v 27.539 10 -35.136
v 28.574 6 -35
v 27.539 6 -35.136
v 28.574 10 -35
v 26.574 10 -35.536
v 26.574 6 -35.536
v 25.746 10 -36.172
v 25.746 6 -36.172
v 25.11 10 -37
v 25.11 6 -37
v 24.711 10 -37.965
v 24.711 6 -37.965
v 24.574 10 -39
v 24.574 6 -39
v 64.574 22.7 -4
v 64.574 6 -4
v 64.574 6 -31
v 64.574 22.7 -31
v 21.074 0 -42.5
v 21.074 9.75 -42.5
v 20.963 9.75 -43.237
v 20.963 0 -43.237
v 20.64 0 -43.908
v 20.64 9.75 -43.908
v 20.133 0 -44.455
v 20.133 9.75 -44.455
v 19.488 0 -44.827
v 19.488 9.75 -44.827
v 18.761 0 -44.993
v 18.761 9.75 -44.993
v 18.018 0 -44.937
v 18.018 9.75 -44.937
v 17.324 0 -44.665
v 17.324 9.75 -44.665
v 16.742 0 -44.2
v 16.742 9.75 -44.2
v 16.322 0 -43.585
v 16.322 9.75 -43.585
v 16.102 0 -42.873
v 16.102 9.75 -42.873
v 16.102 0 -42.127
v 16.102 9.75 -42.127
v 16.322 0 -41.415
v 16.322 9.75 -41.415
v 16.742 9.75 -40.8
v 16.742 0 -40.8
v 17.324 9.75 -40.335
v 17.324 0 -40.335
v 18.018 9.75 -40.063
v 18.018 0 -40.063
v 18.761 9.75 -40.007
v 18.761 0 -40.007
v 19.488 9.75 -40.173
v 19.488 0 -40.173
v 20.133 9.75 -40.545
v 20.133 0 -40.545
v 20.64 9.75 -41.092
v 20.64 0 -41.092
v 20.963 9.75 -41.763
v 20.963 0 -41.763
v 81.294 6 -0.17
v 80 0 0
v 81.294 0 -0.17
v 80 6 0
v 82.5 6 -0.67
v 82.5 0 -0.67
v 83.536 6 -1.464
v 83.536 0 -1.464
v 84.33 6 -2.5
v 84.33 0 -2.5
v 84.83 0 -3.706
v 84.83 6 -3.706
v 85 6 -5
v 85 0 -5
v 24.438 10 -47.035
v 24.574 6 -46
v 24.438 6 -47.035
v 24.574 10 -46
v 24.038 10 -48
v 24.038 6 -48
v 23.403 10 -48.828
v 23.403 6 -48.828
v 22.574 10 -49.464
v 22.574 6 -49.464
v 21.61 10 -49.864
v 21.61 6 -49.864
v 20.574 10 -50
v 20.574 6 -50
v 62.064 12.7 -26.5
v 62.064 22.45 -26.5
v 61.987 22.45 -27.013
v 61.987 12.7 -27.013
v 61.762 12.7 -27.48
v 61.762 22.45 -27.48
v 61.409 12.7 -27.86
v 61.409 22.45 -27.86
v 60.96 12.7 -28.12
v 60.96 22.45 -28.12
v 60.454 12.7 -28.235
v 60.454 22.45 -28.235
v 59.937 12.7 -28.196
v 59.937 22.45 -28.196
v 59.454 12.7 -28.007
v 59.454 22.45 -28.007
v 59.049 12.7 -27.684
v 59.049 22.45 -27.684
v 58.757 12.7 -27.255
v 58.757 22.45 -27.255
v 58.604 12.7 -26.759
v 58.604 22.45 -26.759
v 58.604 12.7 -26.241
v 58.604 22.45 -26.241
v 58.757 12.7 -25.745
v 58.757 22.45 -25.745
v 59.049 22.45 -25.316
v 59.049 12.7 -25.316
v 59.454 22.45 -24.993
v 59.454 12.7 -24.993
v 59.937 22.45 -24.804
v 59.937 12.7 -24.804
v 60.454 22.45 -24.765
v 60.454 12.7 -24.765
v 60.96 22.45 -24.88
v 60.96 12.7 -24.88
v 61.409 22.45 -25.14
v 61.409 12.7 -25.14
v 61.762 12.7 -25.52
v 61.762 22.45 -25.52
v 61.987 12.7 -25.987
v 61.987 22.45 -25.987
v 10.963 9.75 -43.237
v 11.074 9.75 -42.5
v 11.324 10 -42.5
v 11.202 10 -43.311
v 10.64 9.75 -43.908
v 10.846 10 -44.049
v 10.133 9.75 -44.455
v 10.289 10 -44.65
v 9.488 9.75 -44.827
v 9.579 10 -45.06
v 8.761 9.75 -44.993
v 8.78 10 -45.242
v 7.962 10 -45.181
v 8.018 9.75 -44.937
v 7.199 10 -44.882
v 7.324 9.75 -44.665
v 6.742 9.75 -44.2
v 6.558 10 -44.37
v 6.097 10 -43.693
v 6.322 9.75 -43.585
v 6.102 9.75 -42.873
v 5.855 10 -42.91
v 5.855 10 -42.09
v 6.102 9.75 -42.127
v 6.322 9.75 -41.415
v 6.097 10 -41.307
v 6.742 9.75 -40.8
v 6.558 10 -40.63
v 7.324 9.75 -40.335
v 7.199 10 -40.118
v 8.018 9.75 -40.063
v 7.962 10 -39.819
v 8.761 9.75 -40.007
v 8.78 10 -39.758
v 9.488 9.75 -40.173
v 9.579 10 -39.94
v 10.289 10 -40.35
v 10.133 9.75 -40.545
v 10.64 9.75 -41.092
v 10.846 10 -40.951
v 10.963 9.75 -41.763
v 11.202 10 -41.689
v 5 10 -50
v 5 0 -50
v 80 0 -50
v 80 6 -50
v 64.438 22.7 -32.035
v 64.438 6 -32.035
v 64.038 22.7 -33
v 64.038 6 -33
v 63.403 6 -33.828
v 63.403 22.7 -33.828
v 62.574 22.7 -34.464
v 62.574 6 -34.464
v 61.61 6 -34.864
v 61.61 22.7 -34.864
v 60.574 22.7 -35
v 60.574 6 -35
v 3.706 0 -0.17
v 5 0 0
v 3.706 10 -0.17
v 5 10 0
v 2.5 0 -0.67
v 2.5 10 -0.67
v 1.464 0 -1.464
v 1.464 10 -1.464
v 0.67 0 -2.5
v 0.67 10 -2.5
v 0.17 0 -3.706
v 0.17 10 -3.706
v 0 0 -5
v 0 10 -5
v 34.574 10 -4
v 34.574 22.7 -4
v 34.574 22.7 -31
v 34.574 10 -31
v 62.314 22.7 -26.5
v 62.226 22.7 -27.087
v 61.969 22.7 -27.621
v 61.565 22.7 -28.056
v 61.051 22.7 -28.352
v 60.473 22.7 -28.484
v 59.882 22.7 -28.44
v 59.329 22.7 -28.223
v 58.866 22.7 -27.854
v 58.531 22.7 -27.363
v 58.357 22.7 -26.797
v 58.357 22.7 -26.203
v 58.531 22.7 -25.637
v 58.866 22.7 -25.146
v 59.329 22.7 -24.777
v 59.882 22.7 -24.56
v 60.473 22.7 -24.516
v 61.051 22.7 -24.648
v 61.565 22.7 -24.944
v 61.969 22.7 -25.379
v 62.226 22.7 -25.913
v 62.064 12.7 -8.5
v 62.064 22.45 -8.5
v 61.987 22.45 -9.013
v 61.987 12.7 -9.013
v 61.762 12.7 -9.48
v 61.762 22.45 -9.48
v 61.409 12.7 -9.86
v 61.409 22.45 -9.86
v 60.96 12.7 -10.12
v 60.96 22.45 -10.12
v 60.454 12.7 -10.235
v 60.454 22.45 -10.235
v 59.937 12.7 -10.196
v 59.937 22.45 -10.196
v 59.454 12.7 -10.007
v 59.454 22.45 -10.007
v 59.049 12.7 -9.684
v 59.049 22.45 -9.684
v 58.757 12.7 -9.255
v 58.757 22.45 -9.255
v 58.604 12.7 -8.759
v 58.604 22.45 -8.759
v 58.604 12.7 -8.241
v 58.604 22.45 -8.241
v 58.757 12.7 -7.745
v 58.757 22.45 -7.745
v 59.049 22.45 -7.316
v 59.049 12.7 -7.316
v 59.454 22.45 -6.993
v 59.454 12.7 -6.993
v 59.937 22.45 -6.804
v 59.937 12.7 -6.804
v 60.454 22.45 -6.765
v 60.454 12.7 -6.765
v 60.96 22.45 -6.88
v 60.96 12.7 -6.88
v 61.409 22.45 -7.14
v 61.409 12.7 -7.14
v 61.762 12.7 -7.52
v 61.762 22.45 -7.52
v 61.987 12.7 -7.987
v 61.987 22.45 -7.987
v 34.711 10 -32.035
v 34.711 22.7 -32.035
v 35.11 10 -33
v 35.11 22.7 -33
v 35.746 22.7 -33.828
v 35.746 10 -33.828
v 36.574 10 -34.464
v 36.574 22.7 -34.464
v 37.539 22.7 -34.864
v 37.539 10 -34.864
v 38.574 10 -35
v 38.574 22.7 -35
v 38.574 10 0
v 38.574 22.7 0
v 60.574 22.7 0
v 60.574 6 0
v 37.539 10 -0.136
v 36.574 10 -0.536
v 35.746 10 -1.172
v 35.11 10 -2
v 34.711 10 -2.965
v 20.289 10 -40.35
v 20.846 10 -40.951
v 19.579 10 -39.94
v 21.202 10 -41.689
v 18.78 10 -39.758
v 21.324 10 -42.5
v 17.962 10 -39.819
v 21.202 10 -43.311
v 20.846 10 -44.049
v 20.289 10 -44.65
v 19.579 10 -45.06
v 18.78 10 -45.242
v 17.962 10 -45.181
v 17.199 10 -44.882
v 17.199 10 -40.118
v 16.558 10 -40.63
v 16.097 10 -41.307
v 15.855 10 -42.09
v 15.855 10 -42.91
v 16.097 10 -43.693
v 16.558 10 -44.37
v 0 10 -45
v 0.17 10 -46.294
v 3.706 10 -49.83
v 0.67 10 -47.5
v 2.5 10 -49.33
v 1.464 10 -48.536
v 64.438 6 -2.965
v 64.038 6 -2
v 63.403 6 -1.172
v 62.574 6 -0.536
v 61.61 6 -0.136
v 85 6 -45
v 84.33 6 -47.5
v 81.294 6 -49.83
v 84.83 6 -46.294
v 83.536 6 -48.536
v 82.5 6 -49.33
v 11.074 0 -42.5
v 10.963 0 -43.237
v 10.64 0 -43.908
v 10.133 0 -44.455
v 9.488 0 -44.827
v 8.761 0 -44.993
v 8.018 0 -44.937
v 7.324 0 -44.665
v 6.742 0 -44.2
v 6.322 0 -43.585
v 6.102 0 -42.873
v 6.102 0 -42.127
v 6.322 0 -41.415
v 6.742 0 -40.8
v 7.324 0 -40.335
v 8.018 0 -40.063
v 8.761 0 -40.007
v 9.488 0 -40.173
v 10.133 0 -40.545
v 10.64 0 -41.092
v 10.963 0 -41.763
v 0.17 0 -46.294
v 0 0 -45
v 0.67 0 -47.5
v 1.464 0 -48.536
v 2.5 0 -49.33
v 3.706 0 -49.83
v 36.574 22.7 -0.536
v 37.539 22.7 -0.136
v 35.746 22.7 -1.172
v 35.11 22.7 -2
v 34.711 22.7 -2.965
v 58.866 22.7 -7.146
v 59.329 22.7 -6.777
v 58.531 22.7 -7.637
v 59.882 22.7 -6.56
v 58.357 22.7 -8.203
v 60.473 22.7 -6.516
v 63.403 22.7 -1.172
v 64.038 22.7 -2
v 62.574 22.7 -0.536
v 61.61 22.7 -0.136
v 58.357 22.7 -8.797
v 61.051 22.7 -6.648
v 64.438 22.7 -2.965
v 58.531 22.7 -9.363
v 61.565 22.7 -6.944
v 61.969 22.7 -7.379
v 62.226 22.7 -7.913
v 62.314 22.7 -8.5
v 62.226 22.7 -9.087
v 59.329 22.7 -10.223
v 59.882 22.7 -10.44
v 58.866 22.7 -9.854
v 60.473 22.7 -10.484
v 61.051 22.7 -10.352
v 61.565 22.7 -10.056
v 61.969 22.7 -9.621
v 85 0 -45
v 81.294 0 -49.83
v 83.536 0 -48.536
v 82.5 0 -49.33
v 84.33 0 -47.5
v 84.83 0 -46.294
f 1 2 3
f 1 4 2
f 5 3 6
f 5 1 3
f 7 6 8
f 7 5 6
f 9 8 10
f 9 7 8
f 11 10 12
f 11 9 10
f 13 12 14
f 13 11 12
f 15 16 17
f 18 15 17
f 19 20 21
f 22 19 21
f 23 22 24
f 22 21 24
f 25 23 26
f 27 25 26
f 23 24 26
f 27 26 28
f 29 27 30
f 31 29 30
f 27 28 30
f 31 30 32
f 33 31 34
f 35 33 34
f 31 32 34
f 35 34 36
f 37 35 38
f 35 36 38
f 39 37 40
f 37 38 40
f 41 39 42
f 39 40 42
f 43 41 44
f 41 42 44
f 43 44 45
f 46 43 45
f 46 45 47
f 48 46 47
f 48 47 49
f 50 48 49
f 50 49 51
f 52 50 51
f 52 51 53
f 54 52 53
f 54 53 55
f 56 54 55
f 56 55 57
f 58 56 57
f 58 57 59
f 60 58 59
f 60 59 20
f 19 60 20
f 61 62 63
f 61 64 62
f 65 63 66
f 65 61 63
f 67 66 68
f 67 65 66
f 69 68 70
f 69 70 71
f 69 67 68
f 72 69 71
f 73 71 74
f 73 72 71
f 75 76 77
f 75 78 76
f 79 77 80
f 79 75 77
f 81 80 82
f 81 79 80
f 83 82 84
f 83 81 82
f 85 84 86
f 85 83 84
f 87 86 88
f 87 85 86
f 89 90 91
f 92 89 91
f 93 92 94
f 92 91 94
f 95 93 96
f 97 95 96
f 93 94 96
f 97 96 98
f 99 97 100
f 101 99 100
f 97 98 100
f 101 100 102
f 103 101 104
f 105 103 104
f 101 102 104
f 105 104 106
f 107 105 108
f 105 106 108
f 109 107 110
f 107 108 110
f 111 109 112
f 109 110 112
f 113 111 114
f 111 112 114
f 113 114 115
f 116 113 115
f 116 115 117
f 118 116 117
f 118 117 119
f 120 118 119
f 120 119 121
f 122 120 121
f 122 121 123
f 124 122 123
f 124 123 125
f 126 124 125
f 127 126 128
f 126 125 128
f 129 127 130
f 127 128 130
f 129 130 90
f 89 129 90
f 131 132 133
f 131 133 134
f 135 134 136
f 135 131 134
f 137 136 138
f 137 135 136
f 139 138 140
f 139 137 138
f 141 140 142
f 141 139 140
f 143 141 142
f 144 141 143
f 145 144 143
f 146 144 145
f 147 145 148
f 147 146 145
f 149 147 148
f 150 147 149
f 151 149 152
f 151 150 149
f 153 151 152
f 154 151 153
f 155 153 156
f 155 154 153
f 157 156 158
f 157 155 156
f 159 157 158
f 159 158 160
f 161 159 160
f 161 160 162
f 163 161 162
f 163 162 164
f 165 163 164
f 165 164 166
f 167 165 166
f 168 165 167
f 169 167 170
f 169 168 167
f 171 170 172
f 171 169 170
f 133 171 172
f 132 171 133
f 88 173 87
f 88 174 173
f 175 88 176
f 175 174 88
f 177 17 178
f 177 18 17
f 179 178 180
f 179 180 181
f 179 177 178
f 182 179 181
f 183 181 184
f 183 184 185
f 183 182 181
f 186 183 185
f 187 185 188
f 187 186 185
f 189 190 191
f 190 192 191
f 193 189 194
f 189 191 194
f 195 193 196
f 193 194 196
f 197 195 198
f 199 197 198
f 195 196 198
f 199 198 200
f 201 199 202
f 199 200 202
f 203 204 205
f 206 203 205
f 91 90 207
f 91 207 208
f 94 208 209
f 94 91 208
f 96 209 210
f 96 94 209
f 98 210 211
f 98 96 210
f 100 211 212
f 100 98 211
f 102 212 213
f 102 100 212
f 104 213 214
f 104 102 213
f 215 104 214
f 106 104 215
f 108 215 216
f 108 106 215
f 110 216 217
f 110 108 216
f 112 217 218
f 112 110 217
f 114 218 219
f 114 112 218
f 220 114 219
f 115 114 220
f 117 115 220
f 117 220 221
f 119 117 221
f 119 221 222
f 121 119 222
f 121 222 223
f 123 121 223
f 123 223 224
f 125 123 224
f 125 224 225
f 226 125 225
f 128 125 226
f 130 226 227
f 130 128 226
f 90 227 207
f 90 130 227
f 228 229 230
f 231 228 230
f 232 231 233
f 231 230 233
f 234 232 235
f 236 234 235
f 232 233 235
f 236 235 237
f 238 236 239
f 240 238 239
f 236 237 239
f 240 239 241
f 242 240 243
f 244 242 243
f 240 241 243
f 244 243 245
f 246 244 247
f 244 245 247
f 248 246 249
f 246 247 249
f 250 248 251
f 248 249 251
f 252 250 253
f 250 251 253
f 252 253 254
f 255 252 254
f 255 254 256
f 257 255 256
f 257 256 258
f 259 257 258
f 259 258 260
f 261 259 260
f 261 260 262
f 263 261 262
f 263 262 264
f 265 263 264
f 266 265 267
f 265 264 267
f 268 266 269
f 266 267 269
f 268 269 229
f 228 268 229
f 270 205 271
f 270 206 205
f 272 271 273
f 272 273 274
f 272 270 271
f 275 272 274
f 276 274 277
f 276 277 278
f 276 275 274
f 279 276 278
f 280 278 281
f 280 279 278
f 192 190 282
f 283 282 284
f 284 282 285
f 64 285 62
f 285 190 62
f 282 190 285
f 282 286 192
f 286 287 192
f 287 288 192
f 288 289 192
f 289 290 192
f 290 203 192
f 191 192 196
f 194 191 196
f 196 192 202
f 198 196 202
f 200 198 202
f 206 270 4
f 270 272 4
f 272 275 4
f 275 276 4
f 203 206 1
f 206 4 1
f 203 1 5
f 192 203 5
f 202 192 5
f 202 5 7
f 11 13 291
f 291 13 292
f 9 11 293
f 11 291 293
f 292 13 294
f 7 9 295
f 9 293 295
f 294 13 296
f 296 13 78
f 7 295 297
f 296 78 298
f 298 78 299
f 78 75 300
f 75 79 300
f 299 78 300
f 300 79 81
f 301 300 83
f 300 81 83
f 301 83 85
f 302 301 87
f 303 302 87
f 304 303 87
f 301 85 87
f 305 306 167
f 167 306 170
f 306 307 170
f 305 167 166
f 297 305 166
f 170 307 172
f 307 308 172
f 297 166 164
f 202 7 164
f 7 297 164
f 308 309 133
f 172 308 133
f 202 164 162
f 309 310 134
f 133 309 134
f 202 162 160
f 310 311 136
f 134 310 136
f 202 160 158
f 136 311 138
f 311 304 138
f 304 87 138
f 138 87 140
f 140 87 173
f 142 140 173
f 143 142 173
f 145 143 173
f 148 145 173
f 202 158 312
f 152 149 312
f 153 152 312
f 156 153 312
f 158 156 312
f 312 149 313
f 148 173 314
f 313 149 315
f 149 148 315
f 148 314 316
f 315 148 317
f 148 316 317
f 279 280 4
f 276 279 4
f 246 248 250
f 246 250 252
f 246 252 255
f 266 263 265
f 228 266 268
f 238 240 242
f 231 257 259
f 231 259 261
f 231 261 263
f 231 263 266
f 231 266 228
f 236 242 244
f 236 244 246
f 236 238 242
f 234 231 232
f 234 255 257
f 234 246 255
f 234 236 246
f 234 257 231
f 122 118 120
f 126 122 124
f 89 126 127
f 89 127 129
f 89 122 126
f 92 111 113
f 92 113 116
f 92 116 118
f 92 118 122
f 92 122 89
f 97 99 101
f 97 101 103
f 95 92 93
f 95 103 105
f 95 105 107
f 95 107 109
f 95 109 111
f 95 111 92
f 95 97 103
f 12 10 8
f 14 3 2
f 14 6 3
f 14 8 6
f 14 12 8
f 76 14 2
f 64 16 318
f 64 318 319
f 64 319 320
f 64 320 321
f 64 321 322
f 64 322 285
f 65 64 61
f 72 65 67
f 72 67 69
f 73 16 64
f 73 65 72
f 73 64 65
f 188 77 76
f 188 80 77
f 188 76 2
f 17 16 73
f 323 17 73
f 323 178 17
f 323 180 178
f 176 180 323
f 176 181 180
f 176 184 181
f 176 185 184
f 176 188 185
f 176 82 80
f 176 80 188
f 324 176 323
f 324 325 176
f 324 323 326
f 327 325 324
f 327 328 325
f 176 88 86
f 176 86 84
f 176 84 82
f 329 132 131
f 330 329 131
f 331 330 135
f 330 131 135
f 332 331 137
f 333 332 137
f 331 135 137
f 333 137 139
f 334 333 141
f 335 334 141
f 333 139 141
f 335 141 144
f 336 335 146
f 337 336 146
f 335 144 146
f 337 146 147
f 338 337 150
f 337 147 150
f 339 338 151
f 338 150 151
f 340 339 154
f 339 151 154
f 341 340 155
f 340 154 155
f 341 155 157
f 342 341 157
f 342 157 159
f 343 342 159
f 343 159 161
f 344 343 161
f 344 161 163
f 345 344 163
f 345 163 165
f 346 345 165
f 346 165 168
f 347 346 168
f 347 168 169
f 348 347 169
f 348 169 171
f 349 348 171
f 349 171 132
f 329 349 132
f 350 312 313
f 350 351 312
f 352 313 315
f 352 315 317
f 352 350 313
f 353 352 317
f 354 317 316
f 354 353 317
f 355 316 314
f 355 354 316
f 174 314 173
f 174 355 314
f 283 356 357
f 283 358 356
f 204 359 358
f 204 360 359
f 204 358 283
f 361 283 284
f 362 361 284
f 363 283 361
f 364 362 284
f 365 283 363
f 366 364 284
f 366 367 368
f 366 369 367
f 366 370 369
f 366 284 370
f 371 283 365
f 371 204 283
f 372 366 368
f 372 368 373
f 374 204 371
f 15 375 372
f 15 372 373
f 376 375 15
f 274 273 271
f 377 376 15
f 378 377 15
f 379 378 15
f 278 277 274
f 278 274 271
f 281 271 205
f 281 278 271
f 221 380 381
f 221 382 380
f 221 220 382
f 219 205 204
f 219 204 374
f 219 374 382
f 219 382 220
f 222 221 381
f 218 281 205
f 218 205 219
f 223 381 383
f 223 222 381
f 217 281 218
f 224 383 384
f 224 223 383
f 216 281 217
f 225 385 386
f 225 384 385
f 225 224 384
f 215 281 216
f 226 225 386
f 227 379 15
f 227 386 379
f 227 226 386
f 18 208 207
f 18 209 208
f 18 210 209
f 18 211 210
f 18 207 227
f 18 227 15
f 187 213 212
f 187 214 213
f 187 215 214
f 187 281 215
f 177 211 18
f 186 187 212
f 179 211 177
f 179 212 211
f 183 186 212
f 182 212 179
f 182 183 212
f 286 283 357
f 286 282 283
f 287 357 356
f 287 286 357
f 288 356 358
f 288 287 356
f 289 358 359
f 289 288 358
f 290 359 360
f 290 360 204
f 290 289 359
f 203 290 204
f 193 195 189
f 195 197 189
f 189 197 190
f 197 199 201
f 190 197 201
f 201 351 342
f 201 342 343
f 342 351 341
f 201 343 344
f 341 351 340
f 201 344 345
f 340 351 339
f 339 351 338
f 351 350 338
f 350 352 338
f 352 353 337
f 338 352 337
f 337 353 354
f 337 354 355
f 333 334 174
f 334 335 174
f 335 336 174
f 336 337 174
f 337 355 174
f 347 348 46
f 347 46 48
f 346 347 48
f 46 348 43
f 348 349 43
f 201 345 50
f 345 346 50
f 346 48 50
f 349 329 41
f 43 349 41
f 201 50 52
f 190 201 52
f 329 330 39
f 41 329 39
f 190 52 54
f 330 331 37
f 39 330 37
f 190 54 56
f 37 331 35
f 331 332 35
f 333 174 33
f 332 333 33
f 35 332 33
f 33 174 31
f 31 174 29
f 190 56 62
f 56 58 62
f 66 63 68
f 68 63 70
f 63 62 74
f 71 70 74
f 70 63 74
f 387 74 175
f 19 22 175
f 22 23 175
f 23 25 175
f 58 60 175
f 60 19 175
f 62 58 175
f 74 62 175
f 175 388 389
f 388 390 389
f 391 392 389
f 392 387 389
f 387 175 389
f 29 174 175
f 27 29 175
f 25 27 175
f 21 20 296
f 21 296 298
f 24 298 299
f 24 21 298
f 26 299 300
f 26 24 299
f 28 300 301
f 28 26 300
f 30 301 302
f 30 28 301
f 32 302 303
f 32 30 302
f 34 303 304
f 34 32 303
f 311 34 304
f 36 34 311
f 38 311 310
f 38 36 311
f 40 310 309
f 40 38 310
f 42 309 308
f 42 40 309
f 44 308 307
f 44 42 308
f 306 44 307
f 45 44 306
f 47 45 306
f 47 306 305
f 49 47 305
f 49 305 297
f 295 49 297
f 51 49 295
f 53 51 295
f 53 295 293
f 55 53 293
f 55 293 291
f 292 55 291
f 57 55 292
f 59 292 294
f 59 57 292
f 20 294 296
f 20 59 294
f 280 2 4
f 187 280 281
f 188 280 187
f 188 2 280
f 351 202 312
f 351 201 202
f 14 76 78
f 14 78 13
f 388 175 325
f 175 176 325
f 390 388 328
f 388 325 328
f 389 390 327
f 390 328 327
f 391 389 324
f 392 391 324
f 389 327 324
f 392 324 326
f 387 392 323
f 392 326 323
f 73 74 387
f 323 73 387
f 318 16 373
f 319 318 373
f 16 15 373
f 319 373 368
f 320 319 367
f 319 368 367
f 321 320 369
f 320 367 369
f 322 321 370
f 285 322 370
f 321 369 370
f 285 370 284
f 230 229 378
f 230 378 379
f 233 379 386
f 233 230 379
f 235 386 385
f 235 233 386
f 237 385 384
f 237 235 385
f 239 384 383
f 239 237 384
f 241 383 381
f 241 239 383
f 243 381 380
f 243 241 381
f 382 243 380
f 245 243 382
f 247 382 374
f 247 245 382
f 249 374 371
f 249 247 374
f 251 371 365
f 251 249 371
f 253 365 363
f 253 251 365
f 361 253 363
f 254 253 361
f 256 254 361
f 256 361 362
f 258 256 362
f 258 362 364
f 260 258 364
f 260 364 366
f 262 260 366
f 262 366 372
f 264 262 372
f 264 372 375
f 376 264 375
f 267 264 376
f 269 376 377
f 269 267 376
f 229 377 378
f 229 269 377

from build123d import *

# Parameters (mm, degrees)
SKETCH1_W           = 85
SKETCH1_H           = 50
BOSS_EXTRUDE1_DEPTH = 6
BOSS_EXTRUDE2_DEPTH = 4
SKETCH4_R           = 2.5
CUT_EXTRUDE2_DEPTH  = 11
SKETCH5_W           = 55
SKETCH5_H           = 35
BOSS_EXTRUDE3_DEPTH = 16.7
FILLET1_R           = 5
SKETCH6_R           = 1.74
CUT_EXTRUDE3_DEPTH  = 10
SKETCH7_W           = 25
SKETCH7_H           = 35
CUT_EXTRUDE4_DEPTH  = 12.7
FILLET3_R           = 4
FILLET4_R           = 4
FILLET5_R           = 4
CHAMFER1_SIZE       = 0.25


with BuildPart() as part:
    # Sketch1 → Boss-Extrude1 (new body)
    with BuildSketch(Plane(origin=(0, 0, 0), x_dir=(1, 0, 0), z_dir=(0, 1, 0))):
        with Locations((42.5, 25)):
            Rectangle(SKETCH1_W, SKETCH1_H)
    extrude(amount=BOSS_EXTRUDE1_DEPTH)

    # Sketch2 → Boss-Extrude2 (add)
    with BuildSketch(Plane(origin=(0, 6, 0), x_dir=(1, 0, 0), z_dir=(0, 1, 0))):
        Polygon((0, 0), (0, 50), (24.574331447, 50), (24.574331447, 35), (9.574331447, 35), (9.574331447, 0), align=None)
    extrude(amount=BOSS_EXTRUDE2_DEPTH)

    # Sketch4 → Cut-Extrude2 (cut)
    with BuildSketch(Plane(origin=(0, 10, 0), x_dir=(1, 0, 0), z_dir=(0, 1, 0))):
        with Locations((18.574331447, 42.5)):
            Circle(SKETCH4_R)
        with Locations((8.574331447, 42.5)):
            Circle(SKETCH4_R)
    extrude(amount=-CUT_EXTRUDE2_DEPTH, mode=Mode.SUBTRACT)

    # Sketch5 → Boss-Extrude3 (add)
    with BuildSketch(Plane(origin=(0, 6, 0), x_dir=(1, 0, 0), z_dir=(0, 1, 0))):
        with Locations((37.074331447, 17.5)):
            Rectangle(SKETCH5_W, SKETCH5_H)
    extrude(amount=BOSS_EXTRUDE3_DEPTH)

    # Fillet1
    fillet1_edges = [part.edges().sort_by_distance(p)[0] for p in [
        (0, 5, -50),
        (85, 3, -50),
        (85, 3, 0),
        (0, 5, 0),
    ]]
    fillet(fillet1_edges, radius=FILLET1_R)

    # Sketch6 → Cut-Extrude3 (cut)
    with BuildSketch(Plane(origin=(0, 22.7, 0), x_dir=(1, 0, 0), z_dir=(0, 1, 0))):
        with Locations((60.324331447, 26.5)):
            Circle(SKETCH6_R)
        with Locations((60.324331447, 8.5)):
            Circle(SKETCH6_R)
    extrude(amount=-CUT_EXTRUDE3_DEPTH, mode=Mode.SUBTRACT)

    # Sketch7 → Cut-Extrude4 (cut)
    with BuildSketch(Plane(origin=(0, 22.7, 0), x_dir=(1, 0, 0), z_dir=(0, 1, 0))):
        with Locations((22.074331447, 17.5)):
            Rectangle(SKETCH7_W, SKETCH7_H)
    extrude(amount=-CUT_EXTRUDE4_DEPTH, mode=Mode.SUBTRACT)

    # Fillet3
    fillet3_edges = [part.edges().sort_by_distance(p)[0] for p in [
        (34.574331447, 16.35, 0),
        (34.574331447, 16.35, -35),
        (64.574331447, 14.35, -35),
        (64.574331447, 14.35, 0),
    ]]
    fillet(fillet3_edges, radius=FILLET3_R)

    # Fillet4
    fillet4_edges = [part.edges().sort_by_distance(p)[0] for p in [
        (24.574331447, 8, -35),
    ]]
    fillet(fillet4_edges, radius=FILLET4_R)

    # Fillet5
    fillet5_edges = [part.edges().sort_by_distance(p)[0] for p in [
        (24.574331447, 8, -50),
    ]]
    fillet(fillet5_edges, radius=FILLET5_R)

    # Chamfer1
    chamfer1_edges = [part.edges().sort_by_distance(p)[0] for p in [
        (16.074331447, 10, -42.5),
        (6.074331447, 10, -42.5),
        (58.584331447, 22.7, -26.5),
        (58.584331447, 22.7, -8.5),
    ]]
    chamfer(chamfer1_edges, length=CHAMFER1_SIZE)


solid = part.part
